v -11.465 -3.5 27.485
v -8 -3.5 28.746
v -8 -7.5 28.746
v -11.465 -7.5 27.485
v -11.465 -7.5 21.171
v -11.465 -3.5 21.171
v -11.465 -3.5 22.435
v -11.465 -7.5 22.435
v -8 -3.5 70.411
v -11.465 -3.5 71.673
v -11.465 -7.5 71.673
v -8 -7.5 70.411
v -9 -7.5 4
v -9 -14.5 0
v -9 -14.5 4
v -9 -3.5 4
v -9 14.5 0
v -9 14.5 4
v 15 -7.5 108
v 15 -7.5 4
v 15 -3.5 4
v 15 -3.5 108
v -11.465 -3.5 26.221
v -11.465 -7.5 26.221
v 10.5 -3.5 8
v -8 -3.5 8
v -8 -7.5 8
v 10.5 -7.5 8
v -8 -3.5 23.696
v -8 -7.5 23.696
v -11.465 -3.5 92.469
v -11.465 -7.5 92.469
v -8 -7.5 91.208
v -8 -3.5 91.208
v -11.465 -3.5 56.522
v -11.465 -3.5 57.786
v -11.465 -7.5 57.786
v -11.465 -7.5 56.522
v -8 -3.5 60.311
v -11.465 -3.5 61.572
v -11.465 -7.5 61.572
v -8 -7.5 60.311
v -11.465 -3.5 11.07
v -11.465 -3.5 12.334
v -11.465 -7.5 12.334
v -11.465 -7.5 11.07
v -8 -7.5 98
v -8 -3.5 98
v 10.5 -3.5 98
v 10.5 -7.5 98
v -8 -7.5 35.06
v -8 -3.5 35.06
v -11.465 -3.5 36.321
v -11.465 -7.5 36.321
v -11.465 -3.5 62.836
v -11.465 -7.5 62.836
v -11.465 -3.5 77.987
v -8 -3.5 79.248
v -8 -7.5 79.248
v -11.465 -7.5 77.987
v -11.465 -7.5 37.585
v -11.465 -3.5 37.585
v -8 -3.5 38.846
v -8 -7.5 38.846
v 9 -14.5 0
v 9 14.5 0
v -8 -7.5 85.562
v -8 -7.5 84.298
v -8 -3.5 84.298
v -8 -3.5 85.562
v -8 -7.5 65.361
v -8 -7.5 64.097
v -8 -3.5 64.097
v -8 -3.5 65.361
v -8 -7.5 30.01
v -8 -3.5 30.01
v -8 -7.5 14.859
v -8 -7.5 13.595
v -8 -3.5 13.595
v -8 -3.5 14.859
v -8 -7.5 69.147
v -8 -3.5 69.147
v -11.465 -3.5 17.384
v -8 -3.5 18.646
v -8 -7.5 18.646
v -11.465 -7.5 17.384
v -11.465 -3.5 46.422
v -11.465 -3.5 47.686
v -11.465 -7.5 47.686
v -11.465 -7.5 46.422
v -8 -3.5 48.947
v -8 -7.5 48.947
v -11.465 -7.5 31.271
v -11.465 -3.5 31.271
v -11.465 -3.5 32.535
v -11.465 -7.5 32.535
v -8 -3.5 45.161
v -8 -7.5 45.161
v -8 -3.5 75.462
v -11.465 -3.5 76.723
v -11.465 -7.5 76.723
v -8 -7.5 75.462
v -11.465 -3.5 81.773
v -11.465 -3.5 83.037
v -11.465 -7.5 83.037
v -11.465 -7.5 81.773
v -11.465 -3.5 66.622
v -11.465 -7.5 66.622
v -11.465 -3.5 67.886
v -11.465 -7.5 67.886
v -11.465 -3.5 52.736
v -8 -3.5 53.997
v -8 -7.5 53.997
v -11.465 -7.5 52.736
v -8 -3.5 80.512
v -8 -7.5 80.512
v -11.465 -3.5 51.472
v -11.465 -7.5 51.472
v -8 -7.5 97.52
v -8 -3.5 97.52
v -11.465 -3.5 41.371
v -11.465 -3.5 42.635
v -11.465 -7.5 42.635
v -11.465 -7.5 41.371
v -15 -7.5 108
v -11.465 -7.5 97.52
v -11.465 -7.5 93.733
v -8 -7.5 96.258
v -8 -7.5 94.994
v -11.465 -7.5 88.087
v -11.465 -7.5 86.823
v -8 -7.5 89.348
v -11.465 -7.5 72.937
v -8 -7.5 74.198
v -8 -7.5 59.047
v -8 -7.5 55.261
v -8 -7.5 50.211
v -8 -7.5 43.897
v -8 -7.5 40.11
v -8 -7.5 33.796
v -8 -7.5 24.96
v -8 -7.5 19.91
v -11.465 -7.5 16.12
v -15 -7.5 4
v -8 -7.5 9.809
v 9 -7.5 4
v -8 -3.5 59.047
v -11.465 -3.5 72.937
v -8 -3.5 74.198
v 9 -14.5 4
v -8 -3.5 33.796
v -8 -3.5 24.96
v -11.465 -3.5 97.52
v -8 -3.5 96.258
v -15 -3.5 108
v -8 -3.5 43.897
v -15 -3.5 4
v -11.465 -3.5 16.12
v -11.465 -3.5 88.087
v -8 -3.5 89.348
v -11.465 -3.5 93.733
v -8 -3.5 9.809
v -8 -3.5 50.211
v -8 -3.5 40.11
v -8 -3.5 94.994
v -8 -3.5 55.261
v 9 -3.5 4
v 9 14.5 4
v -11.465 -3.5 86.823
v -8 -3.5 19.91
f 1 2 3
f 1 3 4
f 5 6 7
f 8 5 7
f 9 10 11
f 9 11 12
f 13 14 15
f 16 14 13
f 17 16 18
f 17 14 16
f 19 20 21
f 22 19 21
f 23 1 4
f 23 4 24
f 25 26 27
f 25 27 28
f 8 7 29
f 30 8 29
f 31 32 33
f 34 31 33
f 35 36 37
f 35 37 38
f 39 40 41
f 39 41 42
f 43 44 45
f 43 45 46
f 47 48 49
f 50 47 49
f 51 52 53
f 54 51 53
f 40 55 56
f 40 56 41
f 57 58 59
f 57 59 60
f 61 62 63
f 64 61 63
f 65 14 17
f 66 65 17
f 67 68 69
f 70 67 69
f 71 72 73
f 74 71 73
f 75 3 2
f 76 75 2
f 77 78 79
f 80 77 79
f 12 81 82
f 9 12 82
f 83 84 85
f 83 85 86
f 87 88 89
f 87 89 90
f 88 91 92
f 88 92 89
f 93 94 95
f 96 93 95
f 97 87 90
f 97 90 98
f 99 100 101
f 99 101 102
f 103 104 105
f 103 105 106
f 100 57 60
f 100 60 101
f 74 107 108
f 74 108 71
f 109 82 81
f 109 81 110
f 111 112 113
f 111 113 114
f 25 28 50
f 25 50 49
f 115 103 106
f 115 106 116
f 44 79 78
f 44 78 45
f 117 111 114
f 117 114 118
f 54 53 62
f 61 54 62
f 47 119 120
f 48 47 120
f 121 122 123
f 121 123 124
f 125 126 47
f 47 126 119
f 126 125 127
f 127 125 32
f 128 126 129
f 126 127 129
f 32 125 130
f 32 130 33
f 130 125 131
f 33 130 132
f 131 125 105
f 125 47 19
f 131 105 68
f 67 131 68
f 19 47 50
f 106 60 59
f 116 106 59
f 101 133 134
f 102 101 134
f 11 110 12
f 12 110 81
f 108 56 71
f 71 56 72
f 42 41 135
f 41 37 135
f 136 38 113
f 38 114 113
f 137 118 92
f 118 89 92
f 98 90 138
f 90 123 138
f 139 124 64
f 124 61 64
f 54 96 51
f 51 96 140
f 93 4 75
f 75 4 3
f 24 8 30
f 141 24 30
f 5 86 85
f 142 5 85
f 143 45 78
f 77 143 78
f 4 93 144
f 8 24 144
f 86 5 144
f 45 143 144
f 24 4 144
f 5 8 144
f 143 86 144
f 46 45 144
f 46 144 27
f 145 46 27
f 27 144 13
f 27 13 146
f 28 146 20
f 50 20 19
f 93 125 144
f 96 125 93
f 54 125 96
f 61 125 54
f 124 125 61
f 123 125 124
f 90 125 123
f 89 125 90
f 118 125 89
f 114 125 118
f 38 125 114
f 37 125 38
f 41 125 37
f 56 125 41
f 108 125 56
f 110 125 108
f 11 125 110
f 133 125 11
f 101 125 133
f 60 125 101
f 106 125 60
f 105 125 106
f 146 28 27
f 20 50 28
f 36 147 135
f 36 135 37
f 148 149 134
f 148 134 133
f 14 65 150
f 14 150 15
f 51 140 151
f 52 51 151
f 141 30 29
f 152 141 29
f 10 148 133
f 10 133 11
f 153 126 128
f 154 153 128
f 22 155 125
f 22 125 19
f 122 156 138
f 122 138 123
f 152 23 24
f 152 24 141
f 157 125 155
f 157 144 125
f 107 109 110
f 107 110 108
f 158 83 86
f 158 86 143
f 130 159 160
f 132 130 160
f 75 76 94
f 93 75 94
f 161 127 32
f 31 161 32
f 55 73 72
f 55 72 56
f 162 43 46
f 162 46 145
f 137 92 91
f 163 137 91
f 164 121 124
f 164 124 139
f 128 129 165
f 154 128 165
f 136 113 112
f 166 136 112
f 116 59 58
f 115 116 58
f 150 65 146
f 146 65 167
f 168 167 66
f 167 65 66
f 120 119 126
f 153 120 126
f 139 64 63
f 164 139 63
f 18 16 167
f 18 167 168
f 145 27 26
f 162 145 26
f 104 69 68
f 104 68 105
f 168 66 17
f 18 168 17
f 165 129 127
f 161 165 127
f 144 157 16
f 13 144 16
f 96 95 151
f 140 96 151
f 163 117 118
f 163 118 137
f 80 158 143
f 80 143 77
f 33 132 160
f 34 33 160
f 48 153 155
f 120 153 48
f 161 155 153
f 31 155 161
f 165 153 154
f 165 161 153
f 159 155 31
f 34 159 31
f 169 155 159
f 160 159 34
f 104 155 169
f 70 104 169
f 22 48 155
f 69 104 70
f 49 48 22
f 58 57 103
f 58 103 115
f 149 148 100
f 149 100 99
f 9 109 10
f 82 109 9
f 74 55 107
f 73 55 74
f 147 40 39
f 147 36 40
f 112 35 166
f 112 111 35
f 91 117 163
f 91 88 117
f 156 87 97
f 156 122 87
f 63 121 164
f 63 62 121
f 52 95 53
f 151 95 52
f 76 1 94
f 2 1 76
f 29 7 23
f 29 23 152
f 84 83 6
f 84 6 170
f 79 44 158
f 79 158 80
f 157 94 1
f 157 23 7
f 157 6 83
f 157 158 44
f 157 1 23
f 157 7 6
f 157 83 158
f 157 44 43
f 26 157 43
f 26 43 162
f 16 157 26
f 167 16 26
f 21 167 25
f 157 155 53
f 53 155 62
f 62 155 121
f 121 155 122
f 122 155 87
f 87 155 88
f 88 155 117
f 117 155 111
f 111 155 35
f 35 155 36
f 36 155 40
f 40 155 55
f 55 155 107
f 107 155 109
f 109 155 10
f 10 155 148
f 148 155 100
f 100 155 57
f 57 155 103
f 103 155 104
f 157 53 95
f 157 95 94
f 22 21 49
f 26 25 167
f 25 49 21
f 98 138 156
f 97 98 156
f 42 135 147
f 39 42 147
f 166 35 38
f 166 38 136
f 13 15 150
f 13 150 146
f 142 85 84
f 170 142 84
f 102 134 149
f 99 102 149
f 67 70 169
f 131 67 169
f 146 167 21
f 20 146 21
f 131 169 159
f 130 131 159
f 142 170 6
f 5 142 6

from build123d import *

# Parameters (mm, degrees)
CROQUIS1_W              = 29
CROQUIS1_H              = 18
SALIENTE_EXTRUIR1_DEPTH = 4
CROQUIS2_W              = 6
CROQUIS2_H              = 4
CROQUIS2_W_2            = 9
SALIENTE_EXTRUIR3_DEPTH = 4
CROQUIS4_W              = 4.5
CROQUIS4_H              = 4
SALIENTE_EXTRUIR4_DEPTH = 100
CROQUIS5_W              = 7
CROQUIS5_H              = 4
SALIENTE_EXTRUIR5_DEPTH = 100
CROQUIS6_W              = 30
CROQUIS6_H              = 4
SALIENTE_EXTRUIR6_DEPTH = 10
CORTAR_EXTRUIR2_DEPTH   = 10
CORTAR_EXTRUIR3_DEPTH   = 10
CORTAR_EXTRUIR4_DEPTH   = 10
CORTAR_EXTRUIR5_DEPTH   = 10


with BuildPart() as part:
    # Croquis1 → Saliente-Extruir1 (new body)
    with BuildSketch(Plane(origin=(0, 0, 0), x_dir=(0, 1, 0), z_dir=(0, 0, 1))):
        Rectangle(CROQUIS1_W, CROQUIS1_H)
    extrude(amount=SALIENTE_EXTRUIR1_DEPTH)

    # Croquis2 → Saliente-Extruir3 (add)
    with BuildSketch(Plane.XY.offset(4)):
        with Locations((-12, -5.5)):
            Rectangle(CROQUIS2_W, CROQUIS2_H)
        with Locations((-4.5, -5.5)):
            Rectangle(CROQUIS2_W_2, CROQUIS2_H)
        with Locations((4.5, -5.5)):
            Rectangle(CROQUIS2_W_2, CROQUIS2_H)
        with Locations((12, -5.5)):
            Rectangle(CROQUIS2_W, CROQUIS2_H)
    extrude(amount=SALIENTE_EXTRUIR3_DEPTH)

    # Croquis4 → Saliente-Extruir4 (add)
    with BuildSketch(Plane.XY.offset(8)):
        with Locations((12.75, -5.5)):
            Rectangle(CROQUIS4_W, CROQUIS4_H)
    extrude(amount=SALIENTE_EXTRUIR4_DEPTH)

    # Croquis5 → Saliente-Extruir5 (add)
    with BuildSketch(Plane.XY.offset(8)):
        with Locations((-11.5, -5.5)):
            Rectangle(CROQUIS5_W, CROQUIS5_H)
    extrude(amount=SALIENTE_EXTRUIR5_DEPTH)

    # Croquis6 → Saliente-Extruir6 (add)
    with BuildSketch(Plane.XY.offset(108)):
        with Locations((0, -5.5)):
            Rectangle(CROQUIS6_W, CROQUIS6_H)
    extrude(amount=-SALIENTE_EXTRUIR6_DEPTH)

    # Croquis7 → Cortar-Extruir2 (cut)
    with BuildSketch(Plane.XZ.offset(7.5)):
        Polygon((-8, 96.258476268), (-8, 97.519571135), (-11.46482967, 97.519571135), align=None)
    extrude(amount=-CORTAR_EXTRUIR2_DEPTH, mode=Mode.SUBTRACT)

    # Croquis8 → Cortar-Extruir3 (cut)
    with BuildSketch(Plane(origin=(0, -7.5, 0), x_dir=(-1, 0, 0), z_dir=(0, -1, 0))):
        Polygon((8, -94.994476268), (11.46482967, -93.733381401), (8, -93.733381401), align=None)
    extrude(amount=-CORTAR_EXTRUIR3_DEPTH, mode=Mode.SUBTRACT)

    # Croquis9 → Cortar-Extruir4 (cut)
    with BuildSketch(Plane(origin=(0, -7.5, 0), x_dir=(-1, 0, 0), z_dir=(0, -1, 0))):
        Polygon((11.46482967, -93.733381401), (11.46482967, -92.469381401), (8, -91.208286534), (8, -93.733381401), align=None)
    extrude(amount=-CORTAR_EXTRUIR4_DEPTH, mode=Mode.SUBTRACT)

    # Croquis10 → Cortar-Extruir5 (cut)
    with BuildSketch(Plane(origin=(0, -3.5, 0), x_dir=(-1, 0, 0), z_dir=(0, 1, 0))):
        Polygon((11.46482967, 11.070269037), (8, 9.80917417), (8, 13.595363904), (11.46482967, 12.334269037), align=None)
        Polygon((11.46482967, 88.087115043), (8, 89.348209909), (8, 85.562020176), (11.46482967, 86.823115043), align=None)
        Polygon((8, 84.298020176), (11.46482967, 83.036925309), (11.46482967, 81.772925309), (8, 80.511830442), align=None)
        Polygon((8, 79.247830442), (11.46482967, 77.986735575), (11.46482967, 76.722735575), (8, 75.461640708), align=None)
        Polygon((8, 70.411450974), (8, 74.197640708), (11.46482967, 72.936545841), (11.46482967, 71.672545841), align=None)
        Polygon((8, 65.361261241), (8, 69.147450974), (11.46482967, 67.886356108), (11.46482967, 66.622356108), align=None)
        Polygon((8, 60.311071507), (8, 64.097261241), (11.46482967, 62.836166374), (11.46482967, 61.572166374), align=None)
        Polygon((8, 55.260881773), (8, 59.047071507), (11.46482967, 57.78597664), (11.46482967, 56.52197664), align=None)
        Polygon((8, 50.21069204), (8, 53.996881773), (11.46482967, 52.735786906), (11.46482967, 51.471786906), align=None)
        Polygon((8, 45.160502306), (8, 48.94669204), (11.46482967, 47.685597173), (11.46482967, 46.421597173), align=None)
        Polygon((8, 43.896502306), (11.46482967, 42.635407439), (11.46482967, 41.371407439), (8, 40.110312572), align=None)
        Polygon((8, 38.846312572), (8, 35.060122838), (11.46482967, 36.321217705), (11.46482967, 37.585217705), align=None)
        Polygon((8, 33.796122838), (8, 30.009933105), (11.46482967, 31.271027972), (11.46482967, 32.535027972), align=None)
        Polygon((8, 24.959743371), (8, 28.745933105), (11.46482967, 27.484838238), (11.46482967, 26.220838238), align=None)
        Polygon((8, 23.695743371), (8, 19.909553637), (11.46482967, 21.170648504), (11.46482967, 22.434648504), align=None)
        Polygon((8, 14.859363904), (8, 18.645553637), (11.46482967, 17.38445877), (11.46482967, 16.12045877), align=None)
    extrude(amount=-CORTAR_EXTRUIR5_DEPTH, mode=Mode.SUBTRACT)


solid = part.part
